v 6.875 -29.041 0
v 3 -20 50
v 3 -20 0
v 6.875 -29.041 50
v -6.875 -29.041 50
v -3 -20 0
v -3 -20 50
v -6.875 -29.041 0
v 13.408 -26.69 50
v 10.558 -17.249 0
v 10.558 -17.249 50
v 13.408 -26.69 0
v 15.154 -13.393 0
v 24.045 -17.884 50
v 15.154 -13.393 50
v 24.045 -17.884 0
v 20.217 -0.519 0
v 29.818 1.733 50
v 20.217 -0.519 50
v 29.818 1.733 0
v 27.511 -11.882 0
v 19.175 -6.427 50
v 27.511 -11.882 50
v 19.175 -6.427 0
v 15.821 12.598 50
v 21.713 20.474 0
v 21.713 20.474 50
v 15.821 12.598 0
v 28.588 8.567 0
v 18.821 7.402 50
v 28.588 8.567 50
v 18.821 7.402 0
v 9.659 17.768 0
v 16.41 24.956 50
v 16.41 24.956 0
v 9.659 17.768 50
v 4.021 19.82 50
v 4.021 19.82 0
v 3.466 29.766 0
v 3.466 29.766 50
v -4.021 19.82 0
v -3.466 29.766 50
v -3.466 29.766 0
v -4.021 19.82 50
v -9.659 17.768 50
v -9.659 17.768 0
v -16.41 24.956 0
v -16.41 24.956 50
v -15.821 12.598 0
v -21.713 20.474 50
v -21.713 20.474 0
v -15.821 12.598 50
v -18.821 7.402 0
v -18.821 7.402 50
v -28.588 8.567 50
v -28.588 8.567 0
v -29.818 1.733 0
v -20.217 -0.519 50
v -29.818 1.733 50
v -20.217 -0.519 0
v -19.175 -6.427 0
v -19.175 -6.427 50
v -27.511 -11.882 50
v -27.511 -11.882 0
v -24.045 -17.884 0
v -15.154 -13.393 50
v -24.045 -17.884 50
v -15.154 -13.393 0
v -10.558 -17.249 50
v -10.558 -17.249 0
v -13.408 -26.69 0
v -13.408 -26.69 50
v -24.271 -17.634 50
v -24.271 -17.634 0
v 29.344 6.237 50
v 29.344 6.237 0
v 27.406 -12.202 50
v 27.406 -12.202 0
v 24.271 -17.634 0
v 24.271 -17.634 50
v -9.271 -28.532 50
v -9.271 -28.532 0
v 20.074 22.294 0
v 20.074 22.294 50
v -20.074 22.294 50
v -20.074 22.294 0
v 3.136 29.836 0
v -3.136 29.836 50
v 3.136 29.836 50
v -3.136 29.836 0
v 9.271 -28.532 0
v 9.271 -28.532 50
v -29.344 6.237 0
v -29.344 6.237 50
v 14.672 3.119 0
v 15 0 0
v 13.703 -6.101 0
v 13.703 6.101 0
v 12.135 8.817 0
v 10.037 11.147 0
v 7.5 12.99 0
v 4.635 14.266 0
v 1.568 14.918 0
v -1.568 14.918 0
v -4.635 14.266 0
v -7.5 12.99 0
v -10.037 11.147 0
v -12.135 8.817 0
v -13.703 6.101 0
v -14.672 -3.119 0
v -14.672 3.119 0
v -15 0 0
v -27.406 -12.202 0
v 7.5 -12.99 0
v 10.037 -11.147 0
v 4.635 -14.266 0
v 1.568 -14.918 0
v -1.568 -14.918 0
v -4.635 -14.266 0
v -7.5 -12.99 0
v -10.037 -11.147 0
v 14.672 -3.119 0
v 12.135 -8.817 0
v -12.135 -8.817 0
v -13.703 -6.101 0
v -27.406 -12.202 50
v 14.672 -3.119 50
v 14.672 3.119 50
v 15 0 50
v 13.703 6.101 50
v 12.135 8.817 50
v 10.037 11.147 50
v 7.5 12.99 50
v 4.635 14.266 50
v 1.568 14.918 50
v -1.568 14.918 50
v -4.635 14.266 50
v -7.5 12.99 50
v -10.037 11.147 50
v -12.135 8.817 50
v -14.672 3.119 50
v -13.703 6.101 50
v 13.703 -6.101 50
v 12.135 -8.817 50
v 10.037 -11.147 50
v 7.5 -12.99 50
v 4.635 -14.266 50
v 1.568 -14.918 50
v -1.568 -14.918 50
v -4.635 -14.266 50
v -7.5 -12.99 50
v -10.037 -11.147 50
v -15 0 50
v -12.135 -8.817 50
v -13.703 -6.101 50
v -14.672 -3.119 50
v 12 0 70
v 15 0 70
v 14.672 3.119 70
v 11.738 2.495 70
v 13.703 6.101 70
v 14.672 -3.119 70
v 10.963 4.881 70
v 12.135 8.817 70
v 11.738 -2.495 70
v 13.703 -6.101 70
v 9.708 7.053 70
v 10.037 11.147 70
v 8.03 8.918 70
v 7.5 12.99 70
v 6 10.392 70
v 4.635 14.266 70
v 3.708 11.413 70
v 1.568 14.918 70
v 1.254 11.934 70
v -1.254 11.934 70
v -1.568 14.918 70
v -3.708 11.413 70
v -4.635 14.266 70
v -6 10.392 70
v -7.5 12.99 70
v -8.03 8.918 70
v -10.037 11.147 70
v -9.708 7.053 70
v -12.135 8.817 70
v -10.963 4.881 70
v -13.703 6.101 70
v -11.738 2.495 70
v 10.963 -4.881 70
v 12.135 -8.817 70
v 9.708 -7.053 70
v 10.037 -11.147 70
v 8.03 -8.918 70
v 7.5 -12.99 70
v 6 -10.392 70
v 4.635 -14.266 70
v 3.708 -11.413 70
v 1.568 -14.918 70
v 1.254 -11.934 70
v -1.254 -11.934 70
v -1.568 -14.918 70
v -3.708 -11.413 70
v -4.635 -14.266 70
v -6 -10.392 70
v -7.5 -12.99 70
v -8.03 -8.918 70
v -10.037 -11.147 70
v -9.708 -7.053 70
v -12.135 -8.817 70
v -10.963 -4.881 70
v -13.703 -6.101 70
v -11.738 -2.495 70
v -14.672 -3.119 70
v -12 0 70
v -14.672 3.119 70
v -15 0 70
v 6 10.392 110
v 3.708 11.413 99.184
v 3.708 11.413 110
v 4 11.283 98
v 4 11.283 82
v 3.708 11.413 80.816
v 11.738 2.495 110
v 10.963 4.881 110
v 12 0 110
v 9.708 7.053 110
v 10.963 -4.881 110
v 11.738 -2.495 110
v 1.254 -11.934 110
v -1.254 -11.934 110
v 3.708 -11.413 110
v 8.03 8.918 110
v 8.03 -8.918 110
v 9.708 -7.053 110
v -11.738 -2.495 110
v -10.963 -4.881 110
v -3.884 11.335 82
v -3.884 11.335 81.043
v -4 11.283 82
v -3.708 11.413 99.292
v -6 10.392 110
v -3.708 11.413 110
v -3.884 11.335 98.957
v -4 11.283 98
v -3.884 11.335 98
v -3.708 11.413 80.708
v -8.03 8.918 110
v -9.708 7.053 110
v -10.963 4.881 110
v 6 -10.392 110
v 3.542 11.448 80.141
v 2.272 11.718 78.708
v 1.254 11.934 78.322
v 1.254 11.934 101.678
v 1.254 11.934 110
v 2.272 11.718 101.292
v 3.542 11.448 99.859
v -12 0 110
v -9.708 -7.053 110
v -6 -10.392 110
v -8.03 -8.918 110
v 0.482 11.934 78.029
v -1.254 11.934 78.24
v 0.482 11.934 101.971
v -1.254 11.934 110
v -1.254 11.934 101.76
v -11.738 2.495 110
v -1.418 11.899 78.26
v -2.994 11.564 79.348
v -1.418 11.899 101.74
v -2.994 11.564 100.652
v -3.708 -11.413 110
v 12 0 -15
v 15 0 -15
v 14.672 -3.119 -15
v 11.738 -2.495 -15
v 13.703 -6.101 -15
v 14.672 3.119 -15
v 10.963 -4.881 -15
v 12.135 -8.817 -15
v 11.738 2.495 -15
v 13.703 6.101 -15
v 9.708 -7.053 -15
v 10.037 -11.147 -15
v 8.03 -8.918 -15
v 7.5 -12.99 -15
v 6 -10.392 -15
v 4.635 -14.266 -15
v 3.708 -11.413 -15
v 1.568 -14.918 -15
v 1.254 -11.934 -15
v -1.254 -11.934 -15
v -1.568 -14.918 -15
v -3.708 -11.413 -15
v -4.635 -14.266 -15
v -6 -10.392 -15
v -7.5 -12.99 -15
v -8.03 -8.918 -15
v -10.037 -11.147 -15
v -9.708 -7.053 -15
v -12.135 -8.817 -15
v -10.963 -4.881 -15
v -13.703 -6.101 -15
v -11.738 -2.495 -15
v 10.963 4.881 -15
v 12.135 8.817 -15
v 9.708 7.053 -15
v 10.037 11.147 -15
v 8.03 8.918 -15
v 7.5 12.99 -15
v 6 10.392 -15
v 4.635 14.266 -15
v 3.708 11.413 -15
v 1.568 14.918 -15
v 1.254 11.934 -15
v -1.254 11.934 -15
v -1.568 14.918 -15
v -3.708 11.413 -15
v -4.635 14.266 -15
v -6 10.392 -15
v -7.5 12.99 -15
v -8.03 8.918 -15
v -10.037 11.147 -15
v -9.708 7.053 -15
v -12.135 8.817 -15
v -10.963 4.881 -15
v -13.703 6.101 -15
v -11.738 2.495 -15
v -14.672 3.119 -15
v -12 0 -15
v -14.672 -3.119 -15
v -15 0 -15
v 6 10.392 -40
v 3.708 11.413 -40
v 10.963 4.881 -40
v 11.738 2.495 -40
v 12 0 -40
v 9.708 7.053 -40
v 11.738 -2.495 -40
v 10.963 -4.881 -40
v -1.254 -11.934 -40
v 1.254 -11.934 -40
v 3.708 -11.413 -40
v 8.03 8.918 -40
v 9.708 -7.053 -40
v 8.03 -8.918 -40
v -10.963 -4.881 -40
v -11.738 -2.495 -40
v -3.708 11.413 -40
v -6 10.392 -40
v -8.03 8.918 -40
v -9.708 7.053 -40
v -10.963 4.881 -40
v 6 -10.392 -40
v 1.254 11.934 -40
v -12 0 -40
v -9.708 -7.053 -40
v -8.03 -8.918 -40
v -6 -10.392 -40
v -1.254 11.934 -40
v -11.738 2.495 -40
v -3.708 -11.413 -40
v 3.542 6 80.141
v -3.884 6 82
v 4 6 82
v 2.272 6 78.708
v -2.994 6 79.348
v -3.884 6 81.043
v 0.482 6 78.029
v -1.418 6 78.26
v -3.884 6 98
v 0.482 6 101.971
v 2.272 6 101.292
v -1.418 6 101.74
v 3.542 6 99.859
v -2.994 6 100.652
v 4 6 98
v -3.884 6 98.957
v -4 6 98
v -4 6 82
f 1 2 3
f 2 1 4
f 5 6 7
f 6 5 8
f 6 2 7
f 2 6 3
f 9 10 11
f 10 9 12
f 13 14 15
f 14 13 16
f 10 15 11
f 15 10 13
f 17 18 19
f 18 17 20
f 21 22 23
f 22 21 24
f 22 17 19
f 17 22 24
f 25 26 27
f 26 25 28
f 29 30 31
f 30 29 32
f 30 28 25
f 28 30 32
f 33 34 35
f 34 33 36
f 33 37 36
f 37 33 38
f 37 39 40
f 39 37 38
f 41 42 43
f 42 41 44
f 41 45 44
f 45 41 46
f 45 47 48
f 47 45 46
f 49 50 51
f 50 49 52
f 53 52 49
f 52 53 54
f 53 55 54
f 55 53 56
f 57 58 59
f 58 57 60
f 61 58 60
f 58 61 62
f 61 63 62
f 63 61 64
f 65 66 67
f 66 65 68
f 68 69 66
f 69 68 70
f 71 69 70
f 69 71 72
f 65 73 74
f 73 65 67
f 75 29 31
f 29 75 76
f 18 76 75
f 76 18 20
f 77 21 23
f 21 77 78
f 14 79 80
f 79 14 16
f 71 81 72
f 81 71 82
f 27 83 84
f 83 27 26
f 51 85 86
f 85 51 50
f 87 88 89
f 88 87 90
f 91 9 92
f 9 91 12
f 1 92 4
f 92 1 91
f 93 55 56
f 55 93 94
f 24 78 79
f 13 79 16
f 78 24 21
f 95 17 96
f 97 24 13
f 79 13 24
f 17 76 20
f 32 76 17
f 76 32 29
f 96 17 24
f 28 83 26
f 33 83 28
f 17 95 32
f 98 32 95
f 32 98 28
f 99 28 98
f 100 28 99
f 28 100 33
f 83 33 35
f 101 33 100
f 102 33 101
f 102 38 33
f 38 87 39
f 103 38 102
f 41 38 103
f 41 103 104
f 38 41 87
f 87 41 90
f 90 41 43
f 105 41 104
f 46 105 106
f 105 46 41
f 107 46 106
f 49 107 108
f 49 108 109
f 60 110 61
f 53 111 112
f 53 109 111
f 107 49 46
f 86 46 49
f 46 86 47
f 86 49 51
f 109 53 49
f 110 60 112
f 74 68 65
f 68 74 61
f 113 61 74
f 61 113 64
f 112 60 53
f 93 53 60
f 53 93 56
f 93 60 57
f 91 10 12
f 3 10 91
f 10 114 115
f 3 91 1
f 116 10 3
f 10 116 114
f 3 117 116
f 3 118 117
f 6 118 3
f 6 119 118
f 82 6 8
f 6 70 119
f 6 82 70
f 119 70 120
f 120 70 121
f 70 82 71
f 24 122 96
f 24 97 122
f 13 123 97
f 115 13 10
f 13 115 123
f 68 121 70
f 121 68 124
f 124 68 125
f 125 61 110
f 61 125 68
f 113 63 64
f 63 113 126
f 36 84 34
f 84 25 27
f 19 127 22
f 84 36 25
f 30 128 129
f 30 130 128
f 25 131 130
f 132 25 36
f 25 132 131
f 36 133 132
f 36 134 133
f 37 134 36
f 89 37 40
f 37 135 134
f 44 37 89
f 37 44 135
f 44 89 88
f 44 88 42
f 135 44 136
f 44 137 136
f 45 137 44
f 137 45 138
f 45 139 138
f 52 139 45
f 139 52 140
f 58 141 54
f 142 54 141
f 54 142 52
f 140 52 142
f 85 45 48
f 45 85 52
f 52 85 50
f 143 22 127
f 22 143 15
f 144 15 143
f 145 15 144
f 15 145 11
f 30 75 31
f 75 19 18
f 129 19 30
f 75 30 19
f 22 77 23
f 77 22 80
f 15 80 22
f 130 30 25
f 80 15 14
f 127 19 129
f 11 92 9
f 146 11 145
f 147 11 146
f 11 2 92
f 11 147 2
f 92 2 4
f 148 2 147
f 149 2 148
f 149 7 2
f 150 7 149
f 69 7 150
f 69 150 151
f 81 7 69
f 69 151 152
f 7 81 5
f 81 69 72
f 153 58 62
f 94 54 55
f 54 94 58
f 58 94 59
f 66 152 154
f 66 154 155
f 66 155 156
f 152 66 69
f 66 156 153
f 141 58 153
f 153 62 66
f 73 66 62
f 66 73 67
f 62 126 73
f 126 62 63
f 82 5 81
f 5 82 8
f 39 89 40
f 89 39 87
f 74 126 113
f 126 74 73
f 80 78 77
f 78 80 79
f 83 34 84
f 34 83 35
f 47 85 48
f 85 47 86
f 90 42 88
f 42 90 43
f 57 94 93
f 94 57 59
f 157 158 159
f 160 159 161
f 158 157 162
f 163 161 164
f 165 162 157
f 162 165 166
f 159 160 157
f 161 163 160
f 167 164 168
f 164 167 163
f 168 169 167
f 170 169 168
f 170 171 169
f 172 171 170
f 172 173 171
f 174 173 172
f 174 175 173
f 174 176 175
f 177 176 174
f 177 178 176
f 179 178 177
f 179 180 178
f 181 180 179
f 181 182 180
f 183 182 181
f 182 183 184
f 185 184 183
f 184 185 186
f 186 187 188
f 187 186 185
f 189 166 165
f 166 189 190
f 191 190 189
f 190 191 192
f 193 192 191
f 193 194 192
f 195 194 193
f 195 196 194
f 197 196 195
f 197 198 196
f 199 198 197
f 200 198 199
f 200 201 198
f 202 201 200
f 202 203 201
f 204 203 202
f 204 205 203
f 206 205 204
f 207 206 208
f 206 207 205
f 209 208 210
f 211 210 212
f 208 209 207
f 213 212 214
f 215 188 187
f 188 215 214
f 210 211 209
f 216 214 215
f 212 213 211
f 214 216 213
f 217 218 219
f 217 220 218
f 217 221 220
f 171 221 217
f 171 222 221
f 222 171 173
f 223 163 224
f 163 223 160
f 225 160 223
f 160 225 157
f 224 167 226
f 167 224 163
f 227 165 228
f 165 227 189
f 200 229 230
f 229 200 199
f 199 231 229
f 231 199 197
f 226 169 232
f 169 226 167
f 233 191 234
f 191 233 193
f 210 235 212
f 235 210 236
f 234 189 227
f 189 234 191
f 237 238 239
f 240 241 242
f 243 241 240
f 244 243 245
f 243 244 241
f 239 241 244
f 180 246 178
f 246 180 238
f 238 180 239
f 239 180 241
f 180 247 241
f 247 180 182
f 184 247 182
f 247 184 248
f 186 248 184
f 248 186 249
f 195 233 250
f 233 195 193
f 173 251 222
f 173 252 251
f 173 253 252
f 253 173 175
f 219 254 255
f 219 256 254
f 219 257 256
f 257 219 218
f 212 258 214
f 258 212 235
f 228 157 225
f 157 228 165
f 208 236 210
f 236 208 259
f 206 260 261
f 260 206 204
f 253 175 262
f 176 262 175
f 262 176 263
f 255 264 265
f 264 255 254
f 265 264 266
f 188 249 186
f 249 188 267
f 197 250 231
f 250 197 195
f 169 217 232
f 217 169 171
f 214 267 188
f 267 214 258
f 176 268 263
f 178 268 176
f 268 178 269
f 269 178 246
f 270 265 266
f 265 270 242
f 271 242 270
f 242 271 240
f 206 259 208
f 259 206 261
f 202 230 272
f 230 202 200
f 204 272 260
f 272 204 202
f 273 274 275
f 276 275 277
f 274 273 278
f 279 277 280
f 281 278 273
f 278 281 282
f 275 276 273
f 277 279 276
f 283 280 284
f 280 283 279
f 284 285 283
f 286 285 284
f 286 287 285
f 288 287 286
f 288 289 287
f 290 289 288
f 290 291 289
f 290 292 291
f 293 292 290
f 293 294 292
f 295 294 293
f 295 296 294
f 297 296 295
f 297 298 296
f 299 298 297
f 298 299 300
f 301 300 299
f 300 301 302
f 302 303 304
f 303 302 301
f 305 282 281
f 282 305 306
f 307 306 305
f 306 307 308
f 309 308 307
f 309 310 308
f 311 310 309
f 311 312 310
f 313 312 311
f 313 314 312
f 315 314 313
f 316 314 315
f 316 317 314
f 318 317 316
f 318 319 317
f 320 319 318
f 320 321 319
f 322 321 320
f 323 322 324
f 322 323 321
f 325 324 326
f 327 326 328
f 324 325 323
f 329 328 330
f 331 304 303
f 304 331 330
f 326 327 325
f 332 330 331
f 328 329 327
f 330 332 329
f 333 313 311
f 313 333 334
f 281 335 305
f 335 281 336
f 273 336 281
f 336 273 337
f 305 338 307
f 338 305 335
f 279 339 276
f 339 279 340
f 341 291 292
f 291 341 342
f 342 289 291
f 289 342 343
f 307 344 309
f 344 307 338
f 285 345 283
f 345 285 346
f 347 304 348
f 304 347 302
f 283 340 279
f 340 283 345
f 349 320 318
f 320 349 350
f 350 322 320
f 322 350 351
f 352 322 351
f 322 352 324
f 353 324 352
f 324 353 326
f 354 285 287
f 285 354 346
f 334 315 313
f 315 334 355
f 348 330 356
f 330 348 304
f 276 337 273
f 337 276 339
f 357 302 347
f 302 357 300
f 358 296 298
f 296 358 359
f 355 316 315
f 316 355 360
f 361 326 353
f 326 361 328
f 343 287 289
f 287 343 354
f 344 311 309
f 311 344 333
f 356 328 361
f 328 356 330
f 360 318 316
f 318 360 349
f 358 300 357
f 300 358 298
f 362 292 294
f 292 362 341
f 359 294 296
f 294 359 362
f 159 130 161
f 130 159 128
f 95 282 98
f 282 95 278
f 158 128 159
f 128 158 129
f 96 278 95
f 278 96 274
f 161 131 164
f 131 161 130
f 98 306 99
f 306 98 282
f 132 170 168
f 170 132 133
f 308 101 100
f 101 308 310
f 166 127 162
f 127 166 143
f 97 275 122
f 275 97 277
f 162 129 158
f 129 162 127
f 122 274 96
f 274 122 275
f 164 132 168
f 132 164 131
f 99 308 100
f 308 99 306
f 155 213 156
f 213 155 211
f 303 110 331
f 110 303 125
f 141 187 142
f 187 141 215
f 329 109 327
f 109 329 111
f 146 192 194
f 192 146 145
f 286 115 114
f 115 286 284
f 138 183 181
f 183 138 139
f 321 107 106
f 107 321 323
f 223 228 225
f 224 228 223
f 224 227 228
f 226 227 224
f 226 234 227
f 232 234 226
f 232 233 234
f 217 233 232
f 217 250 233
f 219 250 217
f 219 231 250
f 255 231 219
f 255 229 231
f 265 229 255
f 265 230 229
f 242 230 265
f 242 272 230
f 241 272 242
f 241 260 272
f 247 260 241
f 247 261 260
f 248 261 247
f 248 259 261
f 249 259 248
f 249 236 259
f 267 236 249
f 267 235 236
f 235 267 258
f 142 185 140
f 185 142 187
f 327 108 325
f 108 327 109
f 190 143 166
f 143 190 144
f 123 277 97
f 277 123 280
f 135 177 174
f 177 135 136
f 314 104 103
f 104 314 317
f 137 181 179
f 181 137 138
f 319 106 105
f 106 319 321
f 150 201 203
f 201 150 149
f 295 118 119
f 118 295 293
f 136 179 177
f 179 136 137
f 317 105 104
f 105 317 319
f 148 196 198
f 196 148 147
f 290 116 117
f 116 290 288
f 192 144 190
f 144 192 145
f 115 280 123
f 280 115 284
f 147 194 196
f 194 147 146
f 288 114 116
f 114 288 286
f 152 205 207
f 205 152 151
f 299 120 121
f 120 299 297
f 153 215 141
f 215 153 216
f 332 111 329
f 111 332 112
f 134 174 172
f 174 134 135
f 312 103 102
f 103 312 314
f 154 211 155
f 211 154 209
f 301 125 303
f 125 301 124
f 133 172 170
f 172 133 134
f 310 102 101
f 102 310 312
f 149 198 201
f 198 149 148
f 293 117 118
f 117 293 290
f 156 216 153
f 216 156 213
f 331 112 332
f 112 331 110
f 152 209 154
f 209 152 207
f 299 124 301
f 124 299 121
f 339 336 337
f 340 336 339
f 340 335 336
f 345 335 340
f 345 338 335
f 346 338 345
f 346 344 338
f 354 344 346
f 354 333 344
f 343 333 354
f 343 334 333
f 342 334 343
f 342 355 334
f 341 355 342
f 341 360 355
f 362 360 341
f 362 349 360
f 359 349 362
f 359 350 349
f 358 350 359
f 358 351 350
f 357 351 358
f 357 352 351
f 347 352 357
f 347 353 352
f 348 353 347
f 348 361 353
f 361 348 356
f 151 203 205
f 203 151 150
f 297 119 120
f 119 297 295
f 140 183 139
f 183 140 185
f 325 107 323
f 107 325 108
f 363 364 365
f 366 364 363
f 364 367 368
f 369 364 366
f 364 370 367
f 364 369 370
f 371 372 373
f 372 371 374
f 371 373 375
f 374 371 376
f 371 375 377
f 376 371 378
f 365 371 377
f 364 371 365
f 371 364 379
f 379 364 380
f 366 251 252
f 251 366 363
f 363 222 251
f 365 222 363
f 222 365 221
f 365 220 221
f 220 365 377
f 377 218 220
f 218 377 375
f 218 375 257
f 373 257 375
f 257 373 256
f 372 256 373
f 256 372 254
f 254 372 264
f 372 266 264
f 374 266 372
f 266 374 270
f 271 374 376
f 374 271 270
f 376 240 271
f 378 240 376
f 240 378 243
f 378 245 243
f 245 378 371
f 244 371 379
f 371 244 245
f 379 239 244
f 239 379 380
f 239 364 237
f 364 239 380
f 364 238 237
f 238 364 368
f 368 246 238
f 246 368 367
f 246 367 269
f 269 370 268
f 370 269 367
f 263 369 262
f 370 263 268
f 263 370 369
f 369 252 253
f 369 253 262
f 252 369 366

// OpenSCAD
//$fn = 20;

teeth_factor = 1;

union() {
    difference() {
        cylinder(d=60, h=50);
        
        for(angle=[0:40*teeth_factor:360])
            rotate([0,0,angle])
            color("blue")
            translate([0,-30,-10])
            linear_extrude(70)
            scale([teeth_factor, teeth_factor])
            polygon([[-9,-4],[9,-4],[3,10],[-3,10]]);
    }

    difference() {
        translate([0,0,-40])
        cylinder(d=30, h=150);
        
        difference() {
            translate([0,0,70])
            cylinder(d=35, h=60);
            
            translate([0,0,70])
            cylinder(d=24, h=50);
        }
        
        difference() {
            translate([0,0,-45])
            cylinder(d=35, h=30);
            
            translate([0,0,-45])
            cylinder(d=24, h=30);
        }
        
        color("green")
        translate([-4,13,82])
        rotate([90,0,0])
        linear_extrude(7)
        
        union() {
            square([8, 16]);
            translate([4,0,0]) circle(d=8);
            translate([4,16,0]) circle(d=8);
        }
    }
}
